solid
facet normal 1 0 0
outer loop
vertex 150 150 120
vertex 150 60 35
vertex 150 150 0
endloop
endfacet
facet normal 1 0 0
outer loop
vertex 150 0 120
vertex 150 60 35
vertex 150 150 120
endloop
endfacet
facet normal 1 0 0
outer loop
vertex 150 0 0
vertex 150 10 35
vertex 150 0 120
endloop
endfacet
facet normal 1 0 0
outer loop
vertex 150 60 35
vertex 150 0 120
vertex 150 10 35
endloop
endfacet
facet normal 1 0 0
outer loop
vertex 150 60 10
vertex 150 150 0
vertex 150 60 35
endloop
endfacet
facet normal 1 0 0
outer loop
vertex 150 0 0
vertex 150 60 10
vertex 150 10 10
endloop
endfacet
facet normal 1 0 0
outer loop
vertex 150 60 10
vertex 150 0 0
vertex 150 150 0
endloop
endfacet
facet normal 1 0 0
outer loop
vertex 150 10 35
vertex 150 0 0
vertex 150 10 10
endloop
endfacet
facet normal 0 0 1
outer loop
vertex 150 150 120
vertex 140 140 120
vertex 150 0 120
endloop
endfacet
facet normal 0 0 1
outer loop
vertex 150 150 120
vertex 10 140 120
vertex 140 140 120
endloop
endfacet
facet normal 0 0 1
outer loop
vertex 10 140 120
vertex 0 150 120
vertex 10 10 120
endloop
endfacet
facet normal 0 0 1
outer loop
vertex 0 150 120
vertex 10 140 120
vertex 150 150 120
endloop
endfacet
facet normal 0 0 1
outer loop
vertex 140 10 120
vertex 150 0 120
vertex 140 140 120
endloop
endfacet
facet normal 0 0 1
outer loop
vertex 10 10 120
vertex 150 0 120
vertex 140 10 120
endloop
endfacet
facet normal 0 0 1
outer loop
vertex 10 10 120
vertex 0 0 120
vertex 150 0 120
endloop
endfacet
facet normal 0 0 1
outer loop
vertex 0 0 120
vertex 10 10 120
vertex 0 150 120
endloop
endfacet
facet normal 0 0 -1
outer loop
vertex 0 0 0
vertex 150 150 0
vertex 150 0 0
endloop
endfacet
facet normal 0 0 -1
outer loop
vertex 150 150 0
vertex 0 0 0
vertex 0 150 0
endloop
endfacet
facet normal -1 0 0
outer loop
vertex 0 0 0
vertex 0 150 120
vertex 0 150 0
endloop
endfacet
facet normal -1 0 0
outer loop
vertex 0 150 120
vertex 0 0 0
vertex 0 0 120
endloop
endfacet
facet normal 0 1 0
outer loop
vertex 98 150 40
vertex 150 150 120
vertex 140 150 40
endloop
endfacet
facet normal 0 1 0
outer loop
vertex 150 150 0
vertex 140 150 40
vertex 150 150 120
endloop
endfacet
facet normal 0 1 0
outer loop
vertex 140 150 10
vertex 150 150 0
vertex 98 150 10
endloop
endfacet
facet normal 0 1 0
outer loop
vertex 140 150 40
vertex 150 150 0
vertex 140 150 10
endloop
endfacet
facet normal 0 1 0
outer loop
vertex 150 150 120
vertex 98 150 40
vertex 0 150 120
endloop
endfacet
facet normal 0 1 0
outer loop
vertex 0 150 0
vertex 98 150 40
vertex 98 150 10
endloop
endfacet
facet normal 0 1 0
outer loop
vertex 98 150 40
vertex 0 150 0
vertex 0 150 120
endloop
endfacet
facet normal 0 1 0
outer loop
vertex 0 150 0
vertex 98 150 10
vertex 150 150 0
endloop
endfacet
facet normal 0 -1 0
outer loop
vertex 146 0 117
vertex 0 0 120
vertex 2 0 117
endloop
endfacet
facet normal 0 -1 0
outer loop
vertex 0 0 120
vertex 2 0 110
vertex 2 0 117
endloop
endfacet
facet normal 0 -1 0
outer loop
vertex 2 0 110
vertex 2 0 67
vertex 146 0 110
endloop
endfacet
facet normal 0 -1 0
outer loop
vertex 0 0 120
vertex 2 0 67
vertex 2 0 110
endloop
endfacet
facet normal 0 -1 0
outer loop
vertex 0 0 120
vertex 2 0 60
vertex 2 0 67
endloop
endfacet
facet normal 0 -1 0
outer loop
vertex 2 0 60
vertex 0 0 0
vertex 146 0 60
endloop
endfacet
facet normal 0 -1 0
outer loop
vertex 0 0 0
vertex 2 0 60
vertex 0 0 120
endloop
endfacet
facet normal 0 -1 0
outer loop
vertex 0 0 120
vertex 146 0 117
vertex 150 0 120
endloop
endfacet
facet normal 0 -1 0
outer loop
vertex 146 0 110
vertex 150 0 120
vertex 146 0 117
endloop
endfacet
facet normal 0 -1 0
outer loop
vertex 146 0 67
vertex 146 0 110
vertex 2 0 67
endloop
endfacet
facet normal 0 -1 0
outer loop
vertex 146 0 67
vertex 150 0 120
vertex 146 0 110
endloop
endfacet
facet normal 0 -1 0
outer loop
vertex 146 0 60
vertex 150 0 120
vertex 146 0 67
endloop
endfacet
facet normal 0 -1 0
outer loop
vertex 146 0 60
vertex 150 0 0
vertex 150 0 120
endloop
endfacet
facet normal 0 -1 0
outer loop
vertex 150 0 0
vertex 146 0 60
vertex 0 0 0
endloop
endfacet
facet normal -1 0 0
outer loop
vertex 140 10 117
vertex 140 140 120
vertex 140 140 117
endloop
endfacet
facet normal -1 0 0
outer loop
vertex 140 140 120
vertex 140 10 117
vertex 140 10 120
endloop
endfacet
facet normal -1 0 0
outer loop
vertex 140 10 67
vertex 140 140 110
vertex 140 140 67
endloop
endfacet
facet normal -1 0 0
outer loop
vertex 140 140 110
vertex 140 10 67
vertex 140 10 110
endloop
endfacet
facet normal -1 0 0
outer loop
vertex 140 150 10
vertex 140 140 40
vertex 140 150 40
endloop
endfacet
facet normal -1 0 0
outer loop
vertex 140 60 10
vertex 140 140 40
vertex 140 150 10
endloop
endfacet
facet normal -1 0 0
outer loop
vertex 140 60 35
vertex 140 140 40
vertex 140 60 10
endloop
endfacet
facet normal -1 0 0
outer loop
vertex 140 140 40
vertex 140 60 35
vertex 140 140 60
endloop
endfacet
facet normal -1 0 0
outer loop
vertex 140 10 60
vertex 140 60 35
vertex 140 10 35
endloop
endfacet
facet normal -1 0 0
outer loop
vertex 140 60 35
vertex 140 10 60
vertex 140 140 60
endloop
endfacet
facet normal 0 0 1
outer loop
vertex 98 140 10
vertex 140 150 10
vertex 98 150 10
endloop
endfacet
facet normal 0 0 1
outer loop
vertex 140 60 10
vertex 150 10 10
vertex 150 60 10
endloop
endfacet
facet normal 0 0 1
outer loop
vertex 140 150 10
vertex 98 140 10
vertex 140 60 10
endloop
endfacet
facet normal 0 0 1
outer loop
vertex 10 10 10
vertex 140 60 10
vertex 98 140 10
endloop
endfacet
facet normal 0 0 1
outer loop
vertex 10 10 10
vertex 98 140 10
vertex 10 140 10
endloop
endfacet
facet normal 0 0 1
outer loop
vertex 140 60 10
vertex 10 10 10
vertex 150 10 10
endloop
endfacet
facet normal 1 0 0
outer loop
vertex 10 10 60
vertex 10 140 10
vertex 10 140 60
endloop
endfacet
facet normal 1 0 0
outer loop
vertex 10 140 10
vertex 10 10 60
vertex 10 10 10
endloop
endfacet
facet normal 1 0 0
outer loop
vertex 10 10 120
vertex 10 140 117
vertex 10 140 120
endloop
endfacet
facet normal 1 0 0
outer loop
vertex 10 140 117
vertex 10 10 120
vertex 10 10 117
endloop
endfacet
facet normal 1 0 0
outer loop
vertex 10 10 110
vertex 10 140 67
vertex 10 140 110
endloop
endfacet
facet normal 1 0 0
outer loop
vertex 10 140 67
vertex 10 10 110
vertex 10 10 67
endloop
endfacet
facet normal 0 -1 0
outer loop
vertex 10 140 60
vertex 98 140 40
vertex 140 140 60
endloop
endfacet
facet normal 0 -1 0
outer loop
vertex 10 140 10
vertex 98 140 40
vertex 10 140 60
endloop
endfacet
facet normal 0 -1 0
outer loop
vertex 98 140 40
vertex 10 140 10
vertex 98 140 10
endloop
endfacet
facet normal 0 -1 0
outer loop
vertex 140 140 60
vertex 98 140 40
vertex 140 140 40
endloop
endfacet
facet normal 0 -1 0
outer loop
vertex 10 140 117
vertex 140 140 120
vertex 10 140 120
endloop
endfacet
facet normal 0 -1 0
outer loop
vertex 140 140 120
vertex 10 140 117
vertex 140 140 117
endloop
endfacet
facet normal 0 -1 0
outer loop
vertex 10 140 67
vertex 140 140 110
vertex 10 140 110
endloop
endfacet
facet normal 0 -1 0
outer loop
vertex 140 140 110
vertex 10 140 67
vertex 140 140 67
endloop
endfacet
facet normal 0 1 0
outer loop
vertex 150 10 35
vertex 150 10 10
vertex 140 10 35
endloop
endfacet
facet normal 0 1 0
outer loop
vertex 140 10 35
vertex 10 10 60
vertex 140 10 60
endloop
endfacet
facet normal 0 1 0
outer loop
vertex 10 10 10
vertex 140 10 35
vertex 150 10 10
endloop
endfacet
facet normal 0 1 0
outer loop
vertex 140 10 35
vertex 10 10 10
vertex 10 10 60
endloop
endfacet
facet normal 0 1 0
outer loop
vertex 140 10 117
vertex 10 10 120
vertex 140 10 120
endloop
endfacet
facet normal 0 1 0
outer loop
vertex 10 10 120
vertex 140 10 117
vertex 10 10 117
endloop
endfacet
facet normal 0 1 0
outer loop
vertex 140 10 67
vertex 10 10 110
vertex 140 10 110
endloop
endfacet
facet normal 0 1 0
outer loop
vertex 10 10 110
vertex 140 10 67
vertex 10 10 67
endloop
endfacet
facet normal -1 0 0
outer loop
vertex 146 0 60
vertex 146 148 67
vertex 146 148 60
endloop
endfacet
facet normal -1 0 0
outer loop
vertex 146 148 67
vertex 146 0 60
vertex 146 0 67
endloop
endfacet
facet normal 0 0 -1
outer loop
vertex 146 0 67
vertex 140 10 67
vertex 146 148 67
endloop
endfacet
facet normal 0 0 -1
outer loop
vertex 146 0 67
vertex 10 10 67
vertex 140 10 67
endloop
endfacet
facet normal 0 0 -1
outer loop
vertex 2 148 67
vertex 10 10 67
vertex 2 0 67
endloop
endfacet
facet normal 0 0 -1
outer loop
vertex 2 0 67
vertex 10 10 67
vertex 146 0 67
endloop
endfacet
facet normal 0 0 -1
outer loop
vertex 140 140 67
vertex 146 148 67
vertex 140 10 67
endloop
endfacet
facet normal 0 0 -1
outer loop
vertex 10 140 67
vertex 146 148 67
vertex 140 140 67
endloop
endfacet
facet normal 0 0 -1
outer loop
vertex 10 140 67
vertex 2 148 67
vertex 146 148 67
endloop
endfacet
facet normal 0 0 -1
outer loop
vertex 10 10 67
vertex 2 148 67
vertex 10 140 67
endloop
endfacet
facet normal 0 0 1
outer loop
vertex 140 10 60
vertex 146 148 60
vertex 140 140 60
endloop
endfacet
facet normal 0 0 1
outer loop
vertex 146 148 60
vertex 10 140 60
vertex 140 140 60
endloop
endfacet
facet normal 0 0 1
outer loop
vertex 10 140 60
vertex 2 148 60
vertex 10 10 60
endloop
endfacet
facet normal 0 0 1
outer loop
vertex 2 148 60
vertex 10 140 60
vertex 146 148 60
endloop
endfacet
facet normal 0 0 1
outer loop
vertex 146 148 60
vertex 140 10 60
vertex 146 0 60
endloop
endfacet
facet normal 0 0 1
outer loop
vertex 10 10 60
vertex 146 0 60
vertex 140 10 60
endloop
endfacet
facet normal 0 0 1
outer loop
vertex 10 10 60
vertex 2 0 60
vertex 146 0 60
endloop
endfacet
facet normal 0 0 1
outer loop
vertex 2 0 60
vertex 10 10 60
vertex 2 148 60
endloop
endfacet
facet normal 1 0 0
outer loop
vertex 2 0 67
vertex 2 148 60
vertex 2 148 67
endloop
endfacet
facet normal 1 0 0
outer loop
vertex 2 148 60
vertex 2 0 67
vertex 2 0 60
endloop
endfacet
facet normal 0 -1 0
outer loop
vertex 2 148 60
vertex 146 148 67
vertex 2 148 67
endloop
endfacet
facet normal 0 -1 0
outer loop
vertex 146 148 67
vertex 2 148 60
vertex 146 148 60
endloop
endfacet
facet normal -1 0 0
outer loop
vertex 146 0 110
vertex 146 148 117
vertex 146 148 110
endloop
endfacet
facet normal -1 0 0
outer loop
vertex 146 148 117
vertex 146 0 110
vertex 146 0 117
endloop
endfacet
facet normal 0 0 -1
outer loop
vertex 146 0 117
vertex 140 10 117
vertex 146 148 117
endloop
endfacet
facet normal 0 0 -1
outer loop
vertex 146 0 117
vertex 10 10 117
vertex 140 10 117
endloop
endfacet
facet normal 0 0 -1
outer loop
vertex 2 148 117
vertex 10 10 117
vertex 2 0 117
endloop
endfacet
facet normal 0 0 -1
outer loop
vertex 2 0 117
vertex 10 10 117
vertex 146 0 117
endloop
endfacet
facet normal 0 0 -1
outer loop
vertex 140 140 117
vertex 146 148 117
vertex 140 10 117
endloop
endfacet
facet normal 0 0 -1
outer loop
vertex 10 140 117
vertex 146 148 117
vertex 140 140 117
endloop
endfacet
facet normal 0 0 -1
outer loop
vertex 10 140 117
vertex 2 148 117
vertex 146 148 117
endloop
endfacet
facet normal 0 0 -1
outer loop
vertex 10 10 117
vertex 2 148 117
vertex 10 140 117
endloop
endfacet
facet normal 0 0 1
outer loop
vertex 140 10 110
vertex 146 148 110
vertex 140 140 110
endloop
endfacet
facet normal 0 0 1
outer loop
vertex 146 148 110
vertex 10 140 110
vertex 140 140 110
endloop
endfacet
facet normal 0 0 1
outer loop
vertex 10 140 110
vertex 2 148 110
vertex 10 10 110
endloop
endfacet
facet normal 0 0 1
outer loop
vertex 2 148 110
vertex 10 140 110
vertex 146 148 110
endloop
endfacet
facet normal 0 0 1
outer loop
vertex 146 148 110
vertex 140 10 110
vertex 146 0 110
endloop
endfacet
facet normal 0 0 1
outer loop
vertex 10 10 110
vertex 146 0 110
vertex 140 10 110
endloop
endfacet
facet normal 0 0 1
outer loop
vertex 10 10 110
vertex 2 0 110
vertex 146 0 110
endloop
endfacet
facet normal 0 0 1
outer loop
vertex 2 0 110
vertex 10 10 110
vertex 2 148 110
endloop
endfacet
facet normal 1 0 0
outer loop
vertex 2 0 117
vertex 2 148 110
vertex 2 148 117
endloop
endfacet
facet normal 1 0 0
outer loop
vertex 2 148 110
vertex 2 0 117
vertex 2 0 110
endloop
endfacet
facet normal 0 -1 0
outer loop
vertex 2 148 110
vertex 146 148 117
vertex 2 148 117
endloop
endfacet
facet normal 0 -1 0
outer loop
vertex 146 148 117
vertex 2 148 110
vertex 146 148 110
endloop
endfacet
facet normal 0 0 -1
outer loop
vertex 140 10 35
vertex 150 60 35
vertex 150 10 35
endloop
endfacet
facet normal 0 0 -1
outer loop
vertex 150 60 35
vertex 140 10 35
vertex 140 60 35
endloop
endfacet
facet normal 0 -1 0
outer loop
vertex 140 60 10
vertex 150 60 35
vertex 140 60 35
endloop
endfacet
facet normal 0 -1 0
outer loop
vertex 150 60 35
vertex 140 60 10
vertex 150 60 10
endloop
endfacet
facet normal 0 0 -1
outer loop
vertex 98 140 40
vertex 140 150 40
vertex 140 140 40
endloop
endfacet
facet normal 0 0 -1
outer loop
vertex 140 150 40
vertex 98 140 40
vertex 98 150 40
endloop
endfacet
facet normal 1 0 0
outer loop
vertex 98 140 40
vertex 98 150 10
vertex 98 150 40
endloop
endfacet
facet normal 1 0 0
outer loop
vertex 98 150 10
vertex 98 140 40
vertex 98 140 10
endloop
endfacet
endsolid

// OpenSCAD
/*
        ENAMEL PROJECT - MELANIE BALJKO
        MODELLING FOR VERSION 2
        CREATED BY: SHWETA DIXIT - 2017
        
        TITLE --- VERSION 2 - OUTER BOX
        
        (Measurements in mm)
        
        
*/
// Modelling the outer cube
module outer_cube()
{
    // Making a hole in the cube
    difference()
    {
        cube([150, 150, 120]);
        translate([10, 10, 10])
        {
            cube([130, 130, 130]);
        }
        
        // Cutting a hole for the slider to separate the layers
        translate([2, 0, 60])
        {
            cube([144, 148, 7]);
        }
        
        // Cutting a hole for the top lid
        translate([2, 0, 110])
        {
            cube([144, 148, 7]);
        }
        
        // Cutting a hole on the right for HDMI and USB
        translate([140, 10, 10])
        {
            cube([10, 50, 25]);
        }
        
        // Cutting a hole in the back for USB ports and ethernet cable
        translate([98, 140, 10])
        {
            cube([42, 45, 30]);
        }
    }    
}
outer_cube();
 
          
